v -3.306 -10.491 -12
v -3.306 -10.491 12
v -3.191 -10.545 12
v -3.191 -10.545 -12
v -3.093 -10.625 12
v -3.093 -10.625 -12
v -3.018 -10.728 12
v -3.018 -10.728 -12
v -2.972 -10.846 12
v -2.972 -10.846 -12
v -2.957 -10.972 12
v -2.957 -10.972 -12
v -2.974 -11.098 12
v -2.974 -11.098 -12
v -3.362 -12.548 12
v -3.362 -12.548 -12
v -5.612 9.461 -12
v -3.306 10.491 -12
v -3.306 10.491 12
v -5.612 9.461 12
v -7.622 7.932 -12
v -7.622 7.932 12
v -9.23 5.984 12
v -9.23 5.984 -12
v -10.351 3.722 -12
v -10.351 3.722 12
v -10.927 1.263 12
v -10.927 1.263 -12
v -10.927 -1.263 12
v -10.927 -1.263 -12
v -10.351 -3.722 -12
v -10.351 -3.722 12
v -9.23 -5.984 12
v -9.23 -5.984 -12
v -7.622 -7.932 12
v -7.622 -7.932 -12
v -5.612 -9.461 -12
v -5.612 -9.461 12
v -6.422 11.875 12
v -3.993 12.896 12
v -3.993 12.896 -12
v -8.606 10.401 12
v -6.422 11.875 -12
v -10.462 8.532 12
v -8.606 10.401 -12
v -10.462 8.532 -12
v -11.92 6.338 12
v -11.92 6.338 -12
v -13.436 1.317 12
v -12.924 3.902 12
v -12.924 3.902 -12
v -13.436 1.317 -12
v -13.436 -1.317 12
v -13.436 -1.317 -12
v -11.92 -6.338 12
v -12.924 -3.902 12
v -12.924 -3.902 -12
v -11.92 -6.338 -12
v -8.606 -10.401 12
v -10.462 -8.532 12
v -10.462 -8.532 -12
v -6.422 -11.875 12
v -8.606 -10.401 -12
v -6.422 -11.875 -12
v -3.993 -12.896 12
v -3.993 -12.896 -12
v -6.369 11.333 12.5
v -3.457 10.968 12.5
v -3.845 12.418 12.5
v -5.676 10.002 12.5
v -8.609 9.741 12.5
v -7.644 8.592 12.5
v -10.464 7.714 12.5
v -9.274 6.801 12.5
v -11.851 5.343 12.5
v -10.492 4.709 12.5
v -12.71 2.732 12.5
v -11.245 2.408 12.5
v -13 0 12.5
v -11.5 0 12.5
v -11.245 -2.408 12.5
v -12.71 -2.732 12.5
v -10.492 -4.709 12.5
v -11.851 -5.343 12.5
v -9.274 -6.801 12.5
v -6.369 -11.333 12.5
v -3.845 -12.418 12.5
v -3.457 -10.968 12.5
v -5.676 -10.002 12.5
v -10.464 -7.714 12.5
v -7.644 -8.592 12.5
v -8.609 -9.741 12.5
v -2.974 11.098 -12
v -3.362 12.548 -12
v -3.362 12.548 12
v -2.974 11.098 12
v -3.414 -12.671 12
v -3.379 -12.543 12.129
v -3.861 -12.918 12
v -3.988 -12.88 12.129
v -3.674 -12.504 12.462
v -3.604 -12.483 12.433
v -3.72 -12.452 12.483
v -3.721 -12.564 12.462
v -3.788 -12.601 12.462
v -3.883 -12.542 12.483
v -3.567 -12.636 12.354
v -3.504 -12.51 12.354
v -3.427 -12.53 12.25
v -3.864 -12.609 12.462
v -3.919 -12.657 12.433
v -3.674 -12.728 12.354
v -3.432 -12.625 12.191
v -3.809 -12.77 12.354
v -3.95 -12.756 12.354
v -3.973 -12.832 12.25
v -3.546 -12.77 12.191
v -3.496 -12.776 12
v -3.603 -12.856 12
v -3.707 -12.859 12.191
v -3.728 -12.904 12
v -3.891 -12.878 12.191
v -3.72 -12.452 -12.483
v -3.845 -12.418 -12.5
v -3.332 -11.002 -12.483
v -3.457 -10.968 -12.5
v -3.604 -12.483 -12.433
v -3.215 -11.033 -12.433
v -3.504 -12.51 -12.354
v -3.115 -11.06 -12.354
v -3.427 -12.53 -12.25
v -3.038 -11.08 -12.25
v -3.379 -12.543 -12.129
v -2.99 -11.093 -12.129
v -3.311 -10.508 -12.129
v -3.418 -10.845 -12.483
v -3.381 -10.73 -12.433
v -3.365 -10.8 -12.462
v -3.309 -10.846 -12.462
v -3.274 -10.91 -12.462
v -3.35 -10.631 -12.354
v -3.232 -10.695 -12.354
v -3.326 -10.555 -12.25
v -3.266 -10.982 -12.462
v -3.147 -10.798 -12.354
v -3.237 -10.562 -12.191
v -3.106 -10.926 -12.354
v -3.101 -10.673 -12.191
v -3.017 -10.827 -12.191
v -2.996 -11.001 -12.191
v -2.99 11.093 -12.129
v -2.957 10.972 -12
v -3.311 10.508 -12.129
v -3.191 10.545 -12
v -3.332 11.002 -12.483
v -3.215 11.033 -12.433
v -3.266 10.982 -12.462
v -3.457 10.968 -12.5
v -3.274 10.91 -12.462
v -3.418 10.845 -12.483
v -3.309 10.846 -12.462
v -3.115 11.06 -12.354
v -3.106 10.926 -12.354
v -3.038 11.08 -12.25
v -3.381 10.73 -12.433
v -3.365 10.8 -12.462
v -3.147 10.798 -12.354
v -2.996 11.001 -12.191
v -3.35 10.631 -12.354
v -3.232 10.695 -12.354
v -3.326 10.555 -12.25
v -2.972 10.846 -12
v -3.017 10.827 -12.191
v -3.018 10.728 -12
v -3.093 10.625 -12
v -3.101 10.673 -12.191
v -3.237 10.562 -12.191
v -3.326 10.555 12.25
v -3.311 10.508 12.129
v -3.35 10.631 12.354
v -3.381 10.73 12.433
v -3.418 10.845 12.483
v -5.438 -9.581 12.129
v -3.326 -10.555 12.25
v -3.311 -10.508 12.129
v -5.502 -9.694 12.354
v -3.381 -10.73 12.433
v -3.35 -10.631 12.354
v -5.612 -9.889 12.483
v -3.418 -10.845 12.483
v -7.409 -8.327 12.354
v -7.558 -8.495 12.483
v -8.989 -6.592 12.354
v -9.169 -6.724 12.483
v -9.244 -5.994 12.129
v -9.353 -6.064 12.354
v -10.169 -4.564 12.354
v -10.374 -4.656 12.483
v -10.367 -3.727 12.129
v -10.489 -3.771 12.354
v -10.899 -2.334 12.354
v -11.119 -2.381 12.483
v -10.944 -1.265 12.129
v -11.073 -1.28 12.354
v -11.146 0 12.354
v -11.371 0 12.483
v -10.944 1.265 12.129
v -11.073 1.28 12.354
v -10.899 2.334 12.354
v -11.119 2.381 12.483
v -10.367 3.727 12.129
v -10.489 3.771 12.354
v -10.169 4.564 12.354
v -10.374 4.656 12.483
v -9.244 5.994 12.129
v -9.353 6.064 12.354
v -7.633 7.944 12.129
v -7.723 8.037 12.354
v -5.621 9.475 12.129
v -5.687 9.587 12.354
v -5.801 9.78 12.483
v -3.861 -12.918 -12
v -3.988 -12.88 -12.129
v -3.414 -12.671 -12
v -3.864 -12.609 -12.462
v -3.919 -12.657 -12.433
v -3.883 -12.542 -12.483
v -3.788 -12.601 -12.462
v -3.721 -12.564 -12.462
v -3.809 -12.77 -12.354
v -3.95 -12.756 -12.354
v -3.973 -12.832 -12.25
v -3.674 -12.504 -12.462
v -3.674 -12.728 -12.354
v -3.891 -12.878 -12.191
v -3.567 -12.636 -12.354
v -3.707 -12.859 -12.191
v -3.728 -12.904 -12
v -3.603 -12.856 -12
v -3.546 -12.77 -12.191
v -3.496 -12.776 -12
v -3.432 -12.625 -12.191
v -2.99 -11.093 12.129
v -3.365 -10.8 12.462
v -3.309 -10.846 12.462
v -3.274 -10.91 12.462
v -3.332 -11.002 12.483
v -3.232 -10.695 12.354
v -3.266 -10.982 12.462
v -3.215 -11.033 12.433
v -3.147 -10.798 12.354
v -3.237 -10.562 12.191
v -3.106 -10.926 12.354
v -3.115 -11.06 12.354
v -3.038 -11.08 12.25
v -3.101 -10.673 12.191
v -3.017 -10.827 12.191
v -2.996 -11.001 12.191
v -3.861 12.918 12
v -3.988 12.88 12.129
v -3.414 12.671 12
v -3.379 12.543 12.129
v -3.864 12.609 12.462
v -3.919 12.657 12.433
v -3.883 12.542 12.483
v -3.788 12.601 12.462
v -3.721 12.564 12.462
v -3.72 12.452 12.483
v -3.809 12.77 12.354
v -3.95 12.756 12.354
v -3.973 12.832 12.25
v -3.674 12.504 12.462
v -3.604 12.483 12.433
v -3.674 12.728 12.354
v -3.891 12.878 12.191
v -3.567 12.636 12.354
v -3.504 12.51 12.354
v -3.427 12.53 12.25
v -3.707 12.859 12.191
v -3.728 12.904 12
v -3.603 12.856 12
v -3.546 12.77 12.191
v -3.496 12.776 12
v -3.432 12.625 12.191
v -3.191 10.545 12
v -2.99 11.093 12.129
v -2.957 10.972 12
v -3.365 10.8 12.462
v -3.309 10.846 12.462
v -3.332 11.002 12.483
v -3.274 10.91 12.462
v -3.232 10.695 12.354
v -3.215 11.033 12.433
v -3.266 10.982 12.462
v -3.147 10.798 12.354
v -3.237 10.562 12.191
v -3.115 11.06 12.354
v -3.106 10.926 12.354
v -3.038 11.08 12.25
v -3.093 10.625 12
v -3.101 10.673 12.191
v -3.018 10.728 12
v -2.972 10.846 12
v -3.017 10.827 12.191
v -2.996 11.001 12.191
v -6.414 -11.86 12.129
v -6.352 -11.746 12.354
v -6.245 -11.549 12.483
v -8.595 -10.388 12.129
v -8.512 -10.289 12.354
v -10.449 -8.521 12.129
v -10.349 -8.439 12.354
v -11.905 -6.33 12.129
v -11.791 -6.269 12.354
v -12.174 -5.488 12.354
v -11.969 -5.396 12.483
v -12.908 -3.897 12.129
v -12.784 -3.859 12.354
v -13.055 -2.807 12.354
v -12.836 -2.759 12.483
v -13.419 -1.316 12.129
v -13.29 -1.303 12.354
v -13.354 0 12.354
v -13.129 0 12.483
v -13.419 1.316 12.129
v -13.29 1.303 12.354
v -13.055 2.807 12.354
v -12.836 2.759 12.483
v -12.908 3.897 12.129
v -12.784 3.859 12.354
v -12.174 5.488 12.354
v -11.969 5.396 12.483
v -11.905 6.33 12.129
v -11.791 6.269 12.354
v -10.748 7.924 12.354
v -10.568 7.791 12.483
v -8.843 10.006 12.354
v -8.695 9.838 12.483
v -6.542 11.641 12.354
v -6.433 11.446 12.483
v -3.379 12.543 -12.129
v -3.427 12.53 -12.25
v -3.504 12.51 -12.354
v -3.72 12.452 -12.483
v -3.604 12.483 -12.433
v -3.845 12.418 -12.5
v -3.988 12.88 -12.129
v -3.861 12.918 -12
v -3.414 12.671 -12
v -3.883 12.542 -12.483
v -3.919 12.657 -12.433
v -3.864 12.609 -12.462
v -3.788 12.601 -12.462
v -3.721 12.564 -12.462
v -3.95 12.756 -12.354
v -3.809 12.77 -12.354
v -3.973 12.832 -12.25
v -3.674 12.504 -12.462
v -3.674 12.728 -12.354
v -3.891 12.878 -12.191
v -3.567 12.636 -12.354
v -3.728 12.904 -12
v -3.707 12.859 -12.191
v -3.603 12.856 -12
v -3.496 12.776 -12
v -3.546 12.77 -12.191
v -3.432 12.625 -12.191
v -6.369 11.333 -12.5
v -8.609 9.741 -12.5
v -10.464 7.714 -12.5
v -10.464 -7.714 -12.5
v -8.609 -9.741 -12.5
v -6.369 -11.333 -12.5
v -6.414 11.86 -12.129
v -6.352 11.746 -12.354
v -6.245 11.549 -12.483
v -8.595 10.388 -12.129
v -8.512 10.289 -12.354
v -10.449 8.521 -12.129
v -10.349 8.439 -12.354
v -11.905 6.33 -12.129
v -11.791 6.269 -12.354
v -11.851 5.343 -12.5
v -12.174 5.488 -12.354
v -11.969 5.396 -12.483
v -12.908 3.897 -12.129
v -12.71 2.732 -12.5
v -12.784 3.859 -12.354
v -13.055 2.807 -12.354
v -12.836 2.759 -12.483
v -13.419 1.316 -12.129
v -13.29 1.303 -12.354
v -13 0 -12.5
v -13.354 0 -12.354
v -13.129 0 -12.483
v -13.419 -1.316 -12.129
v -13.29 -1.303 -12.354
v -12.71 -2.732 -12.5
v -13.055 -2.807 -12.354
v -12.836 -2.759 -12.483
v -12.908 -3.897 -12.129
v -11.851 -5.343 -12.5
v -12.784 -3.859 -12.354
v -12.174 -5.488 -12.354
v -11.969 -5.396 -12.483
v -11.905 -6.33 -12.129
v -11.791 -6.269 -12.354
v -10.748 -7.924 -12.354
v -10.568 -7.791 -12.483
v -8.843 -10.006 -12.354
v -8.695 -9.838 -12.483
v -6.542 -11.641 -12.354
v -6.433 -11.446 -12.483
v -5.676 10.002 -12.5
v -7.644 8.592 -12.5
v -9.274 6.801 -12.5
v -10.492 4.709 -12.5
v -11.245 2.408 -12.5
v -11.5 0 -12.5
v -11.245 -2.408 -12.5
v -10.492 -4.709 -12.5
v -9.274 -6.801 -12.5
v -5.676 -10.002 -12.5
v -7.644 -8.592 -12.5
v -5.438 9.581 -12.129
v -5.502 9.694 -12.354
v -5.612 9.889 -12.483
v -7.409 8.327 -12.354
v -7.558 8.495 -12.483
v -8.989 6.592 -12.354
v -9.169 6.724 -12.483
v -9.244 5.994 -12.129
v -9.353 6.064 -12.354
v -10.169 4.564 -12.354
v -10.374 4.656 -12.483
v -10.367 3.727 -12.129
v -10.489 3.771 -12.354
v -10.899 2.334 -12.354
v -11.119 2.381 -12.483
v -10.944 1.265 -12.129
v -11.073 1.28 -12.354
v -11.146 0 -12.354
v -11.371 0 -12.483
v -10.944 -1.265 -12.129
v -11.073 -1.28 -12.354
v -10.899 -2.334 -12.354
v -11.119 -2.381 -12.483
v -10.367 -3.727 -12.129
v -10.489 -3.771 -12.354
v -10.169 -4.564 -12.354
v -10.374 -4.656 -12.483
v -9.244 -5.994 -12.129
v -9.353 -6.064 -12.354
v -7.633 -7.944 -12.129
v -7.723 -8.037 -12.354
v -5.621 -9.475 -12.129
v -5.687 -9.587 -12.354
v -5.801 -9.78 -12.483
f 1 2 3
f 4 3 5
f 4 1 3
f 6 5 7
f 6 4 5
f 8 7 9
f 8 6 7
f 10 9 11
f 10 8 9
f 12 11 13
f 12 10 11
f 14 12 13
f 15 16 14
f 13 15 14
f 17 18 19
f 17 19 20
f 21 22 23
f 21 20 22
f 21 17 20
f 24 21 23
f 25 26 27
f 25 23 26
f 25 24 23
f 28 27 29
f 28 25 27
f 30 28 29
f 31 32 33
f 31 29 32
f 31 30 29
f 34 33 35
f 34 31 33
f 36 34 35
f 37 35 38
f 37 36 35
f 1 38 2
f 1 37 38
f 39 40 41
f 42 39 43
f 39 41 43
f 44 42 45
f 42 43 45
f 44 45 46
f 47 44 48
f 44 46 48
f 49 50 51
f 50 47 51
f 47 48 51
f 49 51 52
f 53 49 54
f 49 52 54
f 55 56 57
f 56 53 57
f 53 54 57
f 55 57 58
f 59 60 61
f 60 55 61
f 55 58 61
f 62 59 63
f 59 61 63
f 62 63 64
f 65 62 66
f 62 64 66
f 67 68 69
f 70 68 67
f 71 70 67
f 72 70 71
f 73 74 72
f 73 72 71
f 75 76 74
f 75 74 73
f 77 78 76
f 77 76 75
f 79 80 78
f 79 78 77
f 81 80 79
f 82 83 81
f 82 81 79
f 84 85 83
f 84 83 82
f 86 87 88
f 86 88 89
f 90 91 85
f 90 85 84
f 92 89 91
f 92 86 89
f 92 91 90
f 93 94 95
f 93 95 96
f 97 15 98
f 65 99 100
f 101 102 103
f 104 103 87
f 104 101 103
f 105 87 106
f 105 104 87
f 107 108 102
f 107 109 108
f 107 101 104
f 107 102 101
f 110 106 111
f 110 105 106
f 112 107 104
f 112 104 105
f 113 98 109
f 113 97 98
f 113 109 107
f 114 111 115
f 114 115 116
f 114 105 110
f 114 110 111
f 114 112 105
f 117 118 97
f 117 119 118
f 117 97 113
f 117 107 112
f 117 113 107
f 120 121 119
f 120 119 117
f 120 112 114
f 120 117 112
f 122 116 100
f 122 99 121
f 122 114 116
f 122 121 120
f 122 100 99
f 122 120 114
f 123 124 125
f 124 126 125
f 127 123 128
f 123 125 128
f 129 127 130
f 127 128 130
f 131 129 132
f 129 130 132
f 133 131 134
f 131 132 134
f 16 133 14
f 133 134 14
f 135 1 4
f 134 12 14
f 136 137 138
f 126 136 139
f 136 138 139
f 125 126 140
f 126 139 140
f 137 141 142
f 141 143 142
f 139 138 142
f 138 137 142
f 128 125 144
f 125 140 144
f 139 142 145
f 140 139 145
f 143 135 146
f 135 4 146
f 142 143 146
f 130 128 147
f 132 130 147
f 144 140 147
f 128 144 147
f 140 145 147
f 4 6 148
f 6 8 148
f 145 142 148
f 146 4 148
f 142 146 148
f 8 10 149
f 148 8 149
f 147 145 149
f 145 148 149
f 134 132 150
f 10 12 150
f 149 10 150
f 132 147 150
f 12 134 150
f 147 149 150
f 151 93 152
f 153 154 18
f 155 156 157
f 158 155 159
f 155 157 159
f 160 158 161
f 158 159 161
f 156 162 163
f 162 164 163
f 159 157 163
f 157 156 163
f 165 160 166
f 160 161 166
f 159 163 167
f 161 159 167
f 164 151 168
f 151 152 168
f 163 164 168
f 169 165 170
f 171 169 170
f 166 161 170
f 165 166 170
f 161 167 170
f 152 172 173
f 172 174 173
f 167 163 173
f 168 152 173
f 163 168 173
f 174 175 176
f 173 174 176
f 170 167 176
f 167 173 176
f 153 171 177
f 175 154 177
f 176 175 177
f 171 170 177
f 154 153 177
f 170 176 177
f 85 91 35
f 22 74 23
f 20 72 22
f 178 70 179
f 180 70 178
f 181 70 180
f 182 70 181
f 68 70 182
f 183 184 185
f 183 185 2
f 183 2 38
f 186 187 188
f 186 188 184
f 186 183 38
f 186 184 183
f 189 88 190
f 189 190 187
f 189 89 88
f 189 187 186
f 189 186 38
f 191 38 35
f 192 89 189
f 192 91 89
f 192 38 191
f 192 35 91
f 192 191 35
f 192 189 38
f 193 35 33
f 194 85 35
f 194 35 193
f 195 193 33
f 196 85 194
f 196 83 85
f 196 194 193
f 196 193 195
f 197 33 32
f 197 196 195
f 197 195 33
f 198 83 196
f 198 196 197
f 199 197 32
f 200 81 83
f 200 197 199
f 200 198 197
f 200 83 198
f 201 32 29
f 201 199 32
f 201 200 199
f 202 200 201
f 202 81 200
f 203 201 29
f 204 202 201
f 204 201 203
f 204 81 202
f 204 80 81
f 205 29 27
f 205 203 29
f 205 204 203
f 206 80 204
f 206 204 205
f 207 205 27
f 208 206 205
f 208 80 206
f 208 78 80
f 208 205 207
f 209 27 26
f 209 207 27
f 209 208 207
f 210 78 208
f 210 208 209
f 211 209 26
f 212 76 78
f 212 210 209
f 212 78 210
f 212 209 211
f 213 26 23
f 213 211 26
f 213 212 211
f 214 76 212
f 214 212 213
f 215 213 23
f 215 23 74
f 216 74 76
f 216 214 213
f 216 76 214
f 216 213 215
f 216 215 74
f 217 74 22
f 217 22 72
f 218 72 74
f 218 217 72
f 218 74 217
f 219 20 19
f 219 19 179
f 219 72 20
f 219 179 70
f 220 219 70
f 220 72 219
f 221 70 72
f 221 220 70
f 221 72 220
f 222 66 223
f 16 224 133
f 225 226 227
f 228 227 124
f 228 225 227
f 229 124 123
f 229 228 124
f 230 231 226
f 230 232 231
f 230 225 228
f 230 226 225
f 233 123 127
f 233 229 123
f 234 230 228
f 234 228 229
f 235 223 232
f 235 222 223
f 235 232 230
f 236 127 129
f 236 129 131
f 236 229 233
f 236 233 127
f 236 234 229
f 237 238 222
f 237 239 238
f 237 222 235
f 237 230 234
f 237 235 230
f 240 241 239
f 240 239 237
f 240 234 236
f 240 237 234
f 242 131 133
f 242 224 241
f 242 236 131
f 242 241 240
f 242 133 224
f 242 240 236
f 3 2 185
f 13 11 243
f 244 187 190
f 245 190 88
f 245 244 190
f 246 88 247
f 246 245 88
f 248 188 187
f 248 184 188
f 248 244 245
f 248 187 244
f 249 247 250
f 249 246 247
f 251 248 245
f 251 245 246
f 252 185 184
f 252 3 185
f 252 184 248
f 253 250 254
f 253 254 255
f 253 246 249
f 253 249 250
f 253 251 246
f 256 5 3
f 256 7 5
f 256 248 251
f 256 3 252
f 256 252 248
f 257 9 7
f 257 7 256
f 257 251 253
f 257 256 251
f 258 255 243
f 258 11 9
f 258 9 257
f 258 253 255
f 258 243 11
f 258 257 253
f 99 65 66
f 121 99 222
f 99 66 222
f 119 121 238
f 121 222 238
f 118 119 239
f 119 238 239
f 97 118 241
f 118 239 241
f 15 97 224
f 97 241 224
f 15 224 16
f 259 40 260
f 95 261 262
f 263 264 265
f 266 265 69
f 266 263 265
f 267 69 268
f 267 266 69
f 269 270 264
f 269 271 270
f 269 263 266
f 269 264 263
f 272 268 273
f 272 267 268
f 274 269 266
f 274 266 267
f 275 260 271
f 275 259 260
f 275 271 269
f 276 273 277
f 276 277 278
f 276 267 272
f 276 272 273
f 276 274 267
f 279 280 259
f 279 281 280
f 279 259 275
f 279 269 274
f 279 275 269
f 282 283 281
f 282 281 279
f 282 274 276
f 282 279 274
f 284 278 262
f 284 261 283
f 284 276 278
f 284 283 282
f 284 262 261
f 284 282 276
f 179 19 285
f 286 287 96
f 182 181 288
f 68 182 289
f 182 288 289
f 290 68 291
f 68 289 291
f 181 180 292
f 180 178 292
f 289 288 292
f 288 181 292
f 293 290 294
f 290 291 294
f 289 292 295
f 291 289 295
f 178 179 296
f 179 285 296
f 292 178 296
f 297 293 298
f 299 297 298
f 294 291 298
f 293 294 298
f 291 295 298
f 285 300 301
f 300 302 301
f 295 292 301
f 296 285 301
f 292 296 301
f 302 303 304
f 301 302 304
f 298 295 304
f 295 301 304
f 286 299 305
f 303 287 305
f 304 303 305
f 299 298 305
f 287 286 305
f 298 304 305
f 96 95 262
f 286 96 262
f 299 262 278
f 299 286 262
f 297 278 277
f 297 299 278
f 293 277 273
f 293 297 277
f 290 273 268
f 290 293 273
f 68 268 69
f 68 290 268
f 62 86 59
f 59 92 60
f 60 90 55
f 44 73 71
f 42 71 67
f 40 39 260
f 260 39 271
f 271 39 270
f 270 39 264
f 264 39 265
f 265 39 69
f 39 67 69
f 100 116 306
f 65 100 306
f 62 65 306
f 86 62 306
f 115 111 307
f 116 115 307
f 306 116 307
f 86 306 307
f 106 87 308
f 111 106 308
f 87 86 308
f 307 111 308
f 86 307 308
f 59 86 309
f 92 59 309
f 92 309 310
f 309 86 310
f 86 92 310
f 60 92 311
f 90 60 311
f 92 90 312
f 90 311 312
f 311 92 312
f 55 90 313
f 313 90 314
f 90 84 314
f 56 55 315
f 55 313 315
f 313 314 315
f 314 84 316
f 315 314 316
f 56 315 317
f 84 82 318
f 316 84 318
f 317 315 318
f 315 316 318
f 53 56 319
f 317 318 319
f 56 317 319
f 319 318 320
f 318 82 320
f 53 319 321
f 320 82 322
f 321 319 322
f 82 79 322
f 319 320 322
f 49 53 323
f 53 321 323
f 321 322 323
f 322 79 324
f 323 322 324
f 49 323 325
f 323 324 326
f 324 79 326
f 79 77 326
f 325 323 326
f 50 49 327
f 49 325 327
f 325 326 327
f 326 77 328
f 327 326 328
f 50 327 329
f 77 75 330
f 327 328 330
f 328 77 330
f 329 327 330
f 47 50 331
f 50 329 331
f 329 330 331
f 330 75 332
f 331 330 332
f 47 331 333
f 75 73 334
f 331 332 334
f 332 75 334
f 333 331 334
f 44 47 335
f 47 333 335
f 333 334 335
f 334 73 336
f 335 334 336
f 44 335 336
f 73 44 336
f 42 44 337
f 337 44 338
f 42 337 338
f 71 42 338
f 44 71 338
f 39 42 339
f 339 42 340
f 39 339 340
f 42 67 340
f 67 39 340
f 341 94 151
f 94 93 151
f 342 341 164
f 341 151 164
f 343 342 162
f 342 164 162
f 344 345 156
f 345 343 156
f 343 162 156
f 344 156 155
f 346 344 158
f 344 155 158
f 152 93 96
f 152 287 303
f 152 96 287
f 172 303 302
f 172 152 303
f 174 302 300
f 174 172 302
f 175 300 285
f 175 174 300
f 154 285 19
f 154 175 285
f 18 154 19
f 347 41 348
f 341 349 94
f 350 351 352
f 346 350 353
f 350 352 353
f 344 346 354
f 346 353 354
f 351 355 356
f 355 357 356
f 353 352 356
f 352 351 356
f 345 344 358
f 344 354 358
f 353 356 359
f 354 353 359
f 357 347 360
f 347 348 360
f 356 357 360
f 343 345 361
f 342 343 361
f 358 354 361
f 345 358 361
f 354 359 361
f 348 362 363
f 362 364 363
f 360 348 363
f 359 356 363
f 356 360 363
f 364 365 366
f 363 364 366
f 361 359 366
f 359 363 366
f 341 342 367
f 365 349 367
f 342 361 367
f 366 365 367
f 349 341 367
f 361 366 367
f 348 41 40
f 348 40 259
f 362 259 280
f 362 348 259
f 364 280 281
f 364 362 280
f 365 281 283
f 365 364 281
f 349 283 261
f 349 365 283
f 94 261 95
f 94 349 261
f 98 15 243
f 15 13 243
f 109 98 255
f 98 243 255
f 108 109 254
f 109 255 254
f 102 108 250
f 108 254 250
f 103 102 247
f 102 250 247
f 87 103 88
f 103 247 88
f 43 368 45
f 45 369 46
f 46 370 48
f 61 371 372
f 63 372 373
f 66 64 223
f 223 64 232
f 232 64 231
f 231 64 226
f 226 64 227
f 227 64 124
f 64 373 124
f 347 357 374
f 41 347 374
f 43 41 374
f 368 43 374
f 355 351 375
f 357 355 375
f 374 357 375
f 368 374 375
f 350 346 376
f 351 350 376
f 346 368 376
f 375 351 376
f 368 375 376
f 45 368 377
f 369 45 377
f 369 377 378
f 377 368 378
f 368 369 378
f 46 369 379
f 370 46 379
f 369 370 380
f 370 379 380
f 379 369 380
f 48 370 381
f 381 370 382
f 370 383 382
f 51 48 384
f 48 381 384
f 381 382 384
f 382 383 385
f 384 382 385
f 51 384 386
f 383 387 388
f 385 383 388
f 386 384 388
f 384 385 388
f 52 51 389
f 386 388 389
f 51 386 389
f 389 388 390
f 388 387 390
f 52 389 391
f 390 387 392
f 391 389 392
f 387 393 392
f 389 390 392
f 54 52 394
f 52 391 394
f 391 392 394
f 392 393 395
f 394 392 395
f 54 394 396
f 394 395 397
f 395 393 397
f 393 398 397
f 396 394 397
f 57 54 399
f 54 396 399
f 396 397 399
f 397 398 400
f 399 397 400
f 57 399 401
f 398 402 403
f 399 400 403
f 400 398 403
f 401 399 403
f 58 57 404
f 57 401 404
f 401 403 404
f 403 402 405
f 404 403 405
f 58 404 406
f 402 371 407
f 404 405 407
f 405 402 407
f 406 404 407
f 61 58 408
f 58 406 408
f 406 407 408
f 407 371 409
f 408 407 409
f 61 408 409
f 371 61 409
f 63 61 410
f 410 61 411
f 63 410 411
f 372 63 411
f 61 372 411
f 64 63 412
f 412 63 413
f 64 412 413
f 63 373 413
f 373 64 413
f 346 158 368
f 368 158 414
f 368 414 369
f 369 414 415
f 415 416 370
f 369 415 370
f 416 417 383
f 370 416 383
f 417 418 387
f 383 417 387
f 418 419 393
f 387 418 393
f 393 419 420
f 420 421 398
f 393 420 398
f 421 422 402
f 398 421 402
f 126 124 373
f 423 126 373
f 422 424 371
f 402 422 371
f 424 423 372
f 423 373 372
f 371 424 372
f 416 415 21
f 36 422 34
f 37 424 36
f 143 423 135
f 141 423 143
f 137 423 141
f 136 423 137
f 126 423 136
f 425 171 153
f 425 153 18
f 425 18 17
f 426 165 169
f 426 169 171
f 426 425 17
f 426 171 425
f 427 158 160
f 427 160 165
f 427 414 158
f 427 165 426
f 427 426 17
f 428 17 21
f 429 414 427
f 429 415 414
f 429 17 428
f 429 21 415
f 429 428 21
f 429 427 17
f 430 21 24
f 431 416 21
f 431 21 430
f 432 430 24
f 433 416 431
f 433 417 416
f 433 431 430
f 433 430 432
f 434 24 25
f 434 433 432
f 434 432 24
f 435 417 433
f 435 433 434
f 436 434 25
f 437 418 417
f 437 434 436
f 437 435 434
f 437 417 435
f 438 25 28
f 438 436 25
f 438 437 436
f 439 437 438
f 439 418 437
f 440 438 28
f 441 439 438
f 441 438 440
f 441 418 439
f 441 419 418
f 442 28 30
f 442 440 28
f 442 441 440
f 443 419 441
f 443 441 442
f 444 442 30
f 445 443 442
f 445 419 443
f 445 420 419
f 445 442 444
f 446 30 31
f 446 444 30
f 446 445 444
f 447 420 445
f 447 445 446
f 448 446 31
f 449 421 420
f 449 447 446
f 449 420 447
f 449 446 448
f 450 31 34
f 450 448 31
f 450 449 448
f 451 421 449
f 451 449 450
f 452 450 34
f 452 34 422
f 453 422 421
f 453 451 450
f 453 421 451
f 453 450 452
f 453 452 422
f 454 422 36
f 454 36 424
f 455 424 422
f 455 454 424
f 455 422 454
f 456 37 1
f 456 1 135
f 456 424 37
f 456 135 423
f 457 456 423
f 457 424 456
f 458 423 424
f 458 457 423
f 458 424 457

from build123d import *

# Parameters (mm, degrees)
SKETCH1_W      = 2.5
SKETCH1_H      = 25
REVOLVE1_ANGLE = 150
FILLET1_R      = 0.5


with BuildPart() as part:
    # Sketch1 → Revolve1 (revolve, symmetric)
    with BuildSketch(Plane(origin=(0, 0, 0), x_dir=(1, 0, 0), z_dir=(0, 1, 0))) as revolve1_sk:
        with Locations((-12.25, 0)):
            Rectangle(SKETCH1_W, SKETCH1_H)
    revolve(axis=Axis((0, 0, 0), (0, 0, -1)), revolution_arc=REVOLVE1_ANGLE / 2)
    revolve(revolve1_sk.sketch, axis=Axis((0, 0, 0), (0, 0, 1)), revolution_arc=REVOLVE1_ANGLE / 2)

    # Fillet1
    fillet1_edges = [part.edges().sort_by_distance(p)[0] for p in [
        (-2.847009496, 10.625184089, 0),
        (-3.170533303, 11.832591372, -12.5),
        (-3.170533303, -11.832591372, -12.5),
        (-3.494057109, -13.039998655, 0),
        (-3.170533303, -11.832591372, 12.5),
        (-3.494057109, 13.039998655, 0),
        (-2.847009496, -10.625184089, 0),
        (-13.5, 0, -12.5),
        (-11, 0, -12.5),
        (-11, 0, 12.5),
        (-13.5, 0, 12.5),
        (-3.170533303, 11.832591372, 12.5),
    ]]
    fillet(fillet1_edges, radius=FILLET1_R)


solid = part.part
